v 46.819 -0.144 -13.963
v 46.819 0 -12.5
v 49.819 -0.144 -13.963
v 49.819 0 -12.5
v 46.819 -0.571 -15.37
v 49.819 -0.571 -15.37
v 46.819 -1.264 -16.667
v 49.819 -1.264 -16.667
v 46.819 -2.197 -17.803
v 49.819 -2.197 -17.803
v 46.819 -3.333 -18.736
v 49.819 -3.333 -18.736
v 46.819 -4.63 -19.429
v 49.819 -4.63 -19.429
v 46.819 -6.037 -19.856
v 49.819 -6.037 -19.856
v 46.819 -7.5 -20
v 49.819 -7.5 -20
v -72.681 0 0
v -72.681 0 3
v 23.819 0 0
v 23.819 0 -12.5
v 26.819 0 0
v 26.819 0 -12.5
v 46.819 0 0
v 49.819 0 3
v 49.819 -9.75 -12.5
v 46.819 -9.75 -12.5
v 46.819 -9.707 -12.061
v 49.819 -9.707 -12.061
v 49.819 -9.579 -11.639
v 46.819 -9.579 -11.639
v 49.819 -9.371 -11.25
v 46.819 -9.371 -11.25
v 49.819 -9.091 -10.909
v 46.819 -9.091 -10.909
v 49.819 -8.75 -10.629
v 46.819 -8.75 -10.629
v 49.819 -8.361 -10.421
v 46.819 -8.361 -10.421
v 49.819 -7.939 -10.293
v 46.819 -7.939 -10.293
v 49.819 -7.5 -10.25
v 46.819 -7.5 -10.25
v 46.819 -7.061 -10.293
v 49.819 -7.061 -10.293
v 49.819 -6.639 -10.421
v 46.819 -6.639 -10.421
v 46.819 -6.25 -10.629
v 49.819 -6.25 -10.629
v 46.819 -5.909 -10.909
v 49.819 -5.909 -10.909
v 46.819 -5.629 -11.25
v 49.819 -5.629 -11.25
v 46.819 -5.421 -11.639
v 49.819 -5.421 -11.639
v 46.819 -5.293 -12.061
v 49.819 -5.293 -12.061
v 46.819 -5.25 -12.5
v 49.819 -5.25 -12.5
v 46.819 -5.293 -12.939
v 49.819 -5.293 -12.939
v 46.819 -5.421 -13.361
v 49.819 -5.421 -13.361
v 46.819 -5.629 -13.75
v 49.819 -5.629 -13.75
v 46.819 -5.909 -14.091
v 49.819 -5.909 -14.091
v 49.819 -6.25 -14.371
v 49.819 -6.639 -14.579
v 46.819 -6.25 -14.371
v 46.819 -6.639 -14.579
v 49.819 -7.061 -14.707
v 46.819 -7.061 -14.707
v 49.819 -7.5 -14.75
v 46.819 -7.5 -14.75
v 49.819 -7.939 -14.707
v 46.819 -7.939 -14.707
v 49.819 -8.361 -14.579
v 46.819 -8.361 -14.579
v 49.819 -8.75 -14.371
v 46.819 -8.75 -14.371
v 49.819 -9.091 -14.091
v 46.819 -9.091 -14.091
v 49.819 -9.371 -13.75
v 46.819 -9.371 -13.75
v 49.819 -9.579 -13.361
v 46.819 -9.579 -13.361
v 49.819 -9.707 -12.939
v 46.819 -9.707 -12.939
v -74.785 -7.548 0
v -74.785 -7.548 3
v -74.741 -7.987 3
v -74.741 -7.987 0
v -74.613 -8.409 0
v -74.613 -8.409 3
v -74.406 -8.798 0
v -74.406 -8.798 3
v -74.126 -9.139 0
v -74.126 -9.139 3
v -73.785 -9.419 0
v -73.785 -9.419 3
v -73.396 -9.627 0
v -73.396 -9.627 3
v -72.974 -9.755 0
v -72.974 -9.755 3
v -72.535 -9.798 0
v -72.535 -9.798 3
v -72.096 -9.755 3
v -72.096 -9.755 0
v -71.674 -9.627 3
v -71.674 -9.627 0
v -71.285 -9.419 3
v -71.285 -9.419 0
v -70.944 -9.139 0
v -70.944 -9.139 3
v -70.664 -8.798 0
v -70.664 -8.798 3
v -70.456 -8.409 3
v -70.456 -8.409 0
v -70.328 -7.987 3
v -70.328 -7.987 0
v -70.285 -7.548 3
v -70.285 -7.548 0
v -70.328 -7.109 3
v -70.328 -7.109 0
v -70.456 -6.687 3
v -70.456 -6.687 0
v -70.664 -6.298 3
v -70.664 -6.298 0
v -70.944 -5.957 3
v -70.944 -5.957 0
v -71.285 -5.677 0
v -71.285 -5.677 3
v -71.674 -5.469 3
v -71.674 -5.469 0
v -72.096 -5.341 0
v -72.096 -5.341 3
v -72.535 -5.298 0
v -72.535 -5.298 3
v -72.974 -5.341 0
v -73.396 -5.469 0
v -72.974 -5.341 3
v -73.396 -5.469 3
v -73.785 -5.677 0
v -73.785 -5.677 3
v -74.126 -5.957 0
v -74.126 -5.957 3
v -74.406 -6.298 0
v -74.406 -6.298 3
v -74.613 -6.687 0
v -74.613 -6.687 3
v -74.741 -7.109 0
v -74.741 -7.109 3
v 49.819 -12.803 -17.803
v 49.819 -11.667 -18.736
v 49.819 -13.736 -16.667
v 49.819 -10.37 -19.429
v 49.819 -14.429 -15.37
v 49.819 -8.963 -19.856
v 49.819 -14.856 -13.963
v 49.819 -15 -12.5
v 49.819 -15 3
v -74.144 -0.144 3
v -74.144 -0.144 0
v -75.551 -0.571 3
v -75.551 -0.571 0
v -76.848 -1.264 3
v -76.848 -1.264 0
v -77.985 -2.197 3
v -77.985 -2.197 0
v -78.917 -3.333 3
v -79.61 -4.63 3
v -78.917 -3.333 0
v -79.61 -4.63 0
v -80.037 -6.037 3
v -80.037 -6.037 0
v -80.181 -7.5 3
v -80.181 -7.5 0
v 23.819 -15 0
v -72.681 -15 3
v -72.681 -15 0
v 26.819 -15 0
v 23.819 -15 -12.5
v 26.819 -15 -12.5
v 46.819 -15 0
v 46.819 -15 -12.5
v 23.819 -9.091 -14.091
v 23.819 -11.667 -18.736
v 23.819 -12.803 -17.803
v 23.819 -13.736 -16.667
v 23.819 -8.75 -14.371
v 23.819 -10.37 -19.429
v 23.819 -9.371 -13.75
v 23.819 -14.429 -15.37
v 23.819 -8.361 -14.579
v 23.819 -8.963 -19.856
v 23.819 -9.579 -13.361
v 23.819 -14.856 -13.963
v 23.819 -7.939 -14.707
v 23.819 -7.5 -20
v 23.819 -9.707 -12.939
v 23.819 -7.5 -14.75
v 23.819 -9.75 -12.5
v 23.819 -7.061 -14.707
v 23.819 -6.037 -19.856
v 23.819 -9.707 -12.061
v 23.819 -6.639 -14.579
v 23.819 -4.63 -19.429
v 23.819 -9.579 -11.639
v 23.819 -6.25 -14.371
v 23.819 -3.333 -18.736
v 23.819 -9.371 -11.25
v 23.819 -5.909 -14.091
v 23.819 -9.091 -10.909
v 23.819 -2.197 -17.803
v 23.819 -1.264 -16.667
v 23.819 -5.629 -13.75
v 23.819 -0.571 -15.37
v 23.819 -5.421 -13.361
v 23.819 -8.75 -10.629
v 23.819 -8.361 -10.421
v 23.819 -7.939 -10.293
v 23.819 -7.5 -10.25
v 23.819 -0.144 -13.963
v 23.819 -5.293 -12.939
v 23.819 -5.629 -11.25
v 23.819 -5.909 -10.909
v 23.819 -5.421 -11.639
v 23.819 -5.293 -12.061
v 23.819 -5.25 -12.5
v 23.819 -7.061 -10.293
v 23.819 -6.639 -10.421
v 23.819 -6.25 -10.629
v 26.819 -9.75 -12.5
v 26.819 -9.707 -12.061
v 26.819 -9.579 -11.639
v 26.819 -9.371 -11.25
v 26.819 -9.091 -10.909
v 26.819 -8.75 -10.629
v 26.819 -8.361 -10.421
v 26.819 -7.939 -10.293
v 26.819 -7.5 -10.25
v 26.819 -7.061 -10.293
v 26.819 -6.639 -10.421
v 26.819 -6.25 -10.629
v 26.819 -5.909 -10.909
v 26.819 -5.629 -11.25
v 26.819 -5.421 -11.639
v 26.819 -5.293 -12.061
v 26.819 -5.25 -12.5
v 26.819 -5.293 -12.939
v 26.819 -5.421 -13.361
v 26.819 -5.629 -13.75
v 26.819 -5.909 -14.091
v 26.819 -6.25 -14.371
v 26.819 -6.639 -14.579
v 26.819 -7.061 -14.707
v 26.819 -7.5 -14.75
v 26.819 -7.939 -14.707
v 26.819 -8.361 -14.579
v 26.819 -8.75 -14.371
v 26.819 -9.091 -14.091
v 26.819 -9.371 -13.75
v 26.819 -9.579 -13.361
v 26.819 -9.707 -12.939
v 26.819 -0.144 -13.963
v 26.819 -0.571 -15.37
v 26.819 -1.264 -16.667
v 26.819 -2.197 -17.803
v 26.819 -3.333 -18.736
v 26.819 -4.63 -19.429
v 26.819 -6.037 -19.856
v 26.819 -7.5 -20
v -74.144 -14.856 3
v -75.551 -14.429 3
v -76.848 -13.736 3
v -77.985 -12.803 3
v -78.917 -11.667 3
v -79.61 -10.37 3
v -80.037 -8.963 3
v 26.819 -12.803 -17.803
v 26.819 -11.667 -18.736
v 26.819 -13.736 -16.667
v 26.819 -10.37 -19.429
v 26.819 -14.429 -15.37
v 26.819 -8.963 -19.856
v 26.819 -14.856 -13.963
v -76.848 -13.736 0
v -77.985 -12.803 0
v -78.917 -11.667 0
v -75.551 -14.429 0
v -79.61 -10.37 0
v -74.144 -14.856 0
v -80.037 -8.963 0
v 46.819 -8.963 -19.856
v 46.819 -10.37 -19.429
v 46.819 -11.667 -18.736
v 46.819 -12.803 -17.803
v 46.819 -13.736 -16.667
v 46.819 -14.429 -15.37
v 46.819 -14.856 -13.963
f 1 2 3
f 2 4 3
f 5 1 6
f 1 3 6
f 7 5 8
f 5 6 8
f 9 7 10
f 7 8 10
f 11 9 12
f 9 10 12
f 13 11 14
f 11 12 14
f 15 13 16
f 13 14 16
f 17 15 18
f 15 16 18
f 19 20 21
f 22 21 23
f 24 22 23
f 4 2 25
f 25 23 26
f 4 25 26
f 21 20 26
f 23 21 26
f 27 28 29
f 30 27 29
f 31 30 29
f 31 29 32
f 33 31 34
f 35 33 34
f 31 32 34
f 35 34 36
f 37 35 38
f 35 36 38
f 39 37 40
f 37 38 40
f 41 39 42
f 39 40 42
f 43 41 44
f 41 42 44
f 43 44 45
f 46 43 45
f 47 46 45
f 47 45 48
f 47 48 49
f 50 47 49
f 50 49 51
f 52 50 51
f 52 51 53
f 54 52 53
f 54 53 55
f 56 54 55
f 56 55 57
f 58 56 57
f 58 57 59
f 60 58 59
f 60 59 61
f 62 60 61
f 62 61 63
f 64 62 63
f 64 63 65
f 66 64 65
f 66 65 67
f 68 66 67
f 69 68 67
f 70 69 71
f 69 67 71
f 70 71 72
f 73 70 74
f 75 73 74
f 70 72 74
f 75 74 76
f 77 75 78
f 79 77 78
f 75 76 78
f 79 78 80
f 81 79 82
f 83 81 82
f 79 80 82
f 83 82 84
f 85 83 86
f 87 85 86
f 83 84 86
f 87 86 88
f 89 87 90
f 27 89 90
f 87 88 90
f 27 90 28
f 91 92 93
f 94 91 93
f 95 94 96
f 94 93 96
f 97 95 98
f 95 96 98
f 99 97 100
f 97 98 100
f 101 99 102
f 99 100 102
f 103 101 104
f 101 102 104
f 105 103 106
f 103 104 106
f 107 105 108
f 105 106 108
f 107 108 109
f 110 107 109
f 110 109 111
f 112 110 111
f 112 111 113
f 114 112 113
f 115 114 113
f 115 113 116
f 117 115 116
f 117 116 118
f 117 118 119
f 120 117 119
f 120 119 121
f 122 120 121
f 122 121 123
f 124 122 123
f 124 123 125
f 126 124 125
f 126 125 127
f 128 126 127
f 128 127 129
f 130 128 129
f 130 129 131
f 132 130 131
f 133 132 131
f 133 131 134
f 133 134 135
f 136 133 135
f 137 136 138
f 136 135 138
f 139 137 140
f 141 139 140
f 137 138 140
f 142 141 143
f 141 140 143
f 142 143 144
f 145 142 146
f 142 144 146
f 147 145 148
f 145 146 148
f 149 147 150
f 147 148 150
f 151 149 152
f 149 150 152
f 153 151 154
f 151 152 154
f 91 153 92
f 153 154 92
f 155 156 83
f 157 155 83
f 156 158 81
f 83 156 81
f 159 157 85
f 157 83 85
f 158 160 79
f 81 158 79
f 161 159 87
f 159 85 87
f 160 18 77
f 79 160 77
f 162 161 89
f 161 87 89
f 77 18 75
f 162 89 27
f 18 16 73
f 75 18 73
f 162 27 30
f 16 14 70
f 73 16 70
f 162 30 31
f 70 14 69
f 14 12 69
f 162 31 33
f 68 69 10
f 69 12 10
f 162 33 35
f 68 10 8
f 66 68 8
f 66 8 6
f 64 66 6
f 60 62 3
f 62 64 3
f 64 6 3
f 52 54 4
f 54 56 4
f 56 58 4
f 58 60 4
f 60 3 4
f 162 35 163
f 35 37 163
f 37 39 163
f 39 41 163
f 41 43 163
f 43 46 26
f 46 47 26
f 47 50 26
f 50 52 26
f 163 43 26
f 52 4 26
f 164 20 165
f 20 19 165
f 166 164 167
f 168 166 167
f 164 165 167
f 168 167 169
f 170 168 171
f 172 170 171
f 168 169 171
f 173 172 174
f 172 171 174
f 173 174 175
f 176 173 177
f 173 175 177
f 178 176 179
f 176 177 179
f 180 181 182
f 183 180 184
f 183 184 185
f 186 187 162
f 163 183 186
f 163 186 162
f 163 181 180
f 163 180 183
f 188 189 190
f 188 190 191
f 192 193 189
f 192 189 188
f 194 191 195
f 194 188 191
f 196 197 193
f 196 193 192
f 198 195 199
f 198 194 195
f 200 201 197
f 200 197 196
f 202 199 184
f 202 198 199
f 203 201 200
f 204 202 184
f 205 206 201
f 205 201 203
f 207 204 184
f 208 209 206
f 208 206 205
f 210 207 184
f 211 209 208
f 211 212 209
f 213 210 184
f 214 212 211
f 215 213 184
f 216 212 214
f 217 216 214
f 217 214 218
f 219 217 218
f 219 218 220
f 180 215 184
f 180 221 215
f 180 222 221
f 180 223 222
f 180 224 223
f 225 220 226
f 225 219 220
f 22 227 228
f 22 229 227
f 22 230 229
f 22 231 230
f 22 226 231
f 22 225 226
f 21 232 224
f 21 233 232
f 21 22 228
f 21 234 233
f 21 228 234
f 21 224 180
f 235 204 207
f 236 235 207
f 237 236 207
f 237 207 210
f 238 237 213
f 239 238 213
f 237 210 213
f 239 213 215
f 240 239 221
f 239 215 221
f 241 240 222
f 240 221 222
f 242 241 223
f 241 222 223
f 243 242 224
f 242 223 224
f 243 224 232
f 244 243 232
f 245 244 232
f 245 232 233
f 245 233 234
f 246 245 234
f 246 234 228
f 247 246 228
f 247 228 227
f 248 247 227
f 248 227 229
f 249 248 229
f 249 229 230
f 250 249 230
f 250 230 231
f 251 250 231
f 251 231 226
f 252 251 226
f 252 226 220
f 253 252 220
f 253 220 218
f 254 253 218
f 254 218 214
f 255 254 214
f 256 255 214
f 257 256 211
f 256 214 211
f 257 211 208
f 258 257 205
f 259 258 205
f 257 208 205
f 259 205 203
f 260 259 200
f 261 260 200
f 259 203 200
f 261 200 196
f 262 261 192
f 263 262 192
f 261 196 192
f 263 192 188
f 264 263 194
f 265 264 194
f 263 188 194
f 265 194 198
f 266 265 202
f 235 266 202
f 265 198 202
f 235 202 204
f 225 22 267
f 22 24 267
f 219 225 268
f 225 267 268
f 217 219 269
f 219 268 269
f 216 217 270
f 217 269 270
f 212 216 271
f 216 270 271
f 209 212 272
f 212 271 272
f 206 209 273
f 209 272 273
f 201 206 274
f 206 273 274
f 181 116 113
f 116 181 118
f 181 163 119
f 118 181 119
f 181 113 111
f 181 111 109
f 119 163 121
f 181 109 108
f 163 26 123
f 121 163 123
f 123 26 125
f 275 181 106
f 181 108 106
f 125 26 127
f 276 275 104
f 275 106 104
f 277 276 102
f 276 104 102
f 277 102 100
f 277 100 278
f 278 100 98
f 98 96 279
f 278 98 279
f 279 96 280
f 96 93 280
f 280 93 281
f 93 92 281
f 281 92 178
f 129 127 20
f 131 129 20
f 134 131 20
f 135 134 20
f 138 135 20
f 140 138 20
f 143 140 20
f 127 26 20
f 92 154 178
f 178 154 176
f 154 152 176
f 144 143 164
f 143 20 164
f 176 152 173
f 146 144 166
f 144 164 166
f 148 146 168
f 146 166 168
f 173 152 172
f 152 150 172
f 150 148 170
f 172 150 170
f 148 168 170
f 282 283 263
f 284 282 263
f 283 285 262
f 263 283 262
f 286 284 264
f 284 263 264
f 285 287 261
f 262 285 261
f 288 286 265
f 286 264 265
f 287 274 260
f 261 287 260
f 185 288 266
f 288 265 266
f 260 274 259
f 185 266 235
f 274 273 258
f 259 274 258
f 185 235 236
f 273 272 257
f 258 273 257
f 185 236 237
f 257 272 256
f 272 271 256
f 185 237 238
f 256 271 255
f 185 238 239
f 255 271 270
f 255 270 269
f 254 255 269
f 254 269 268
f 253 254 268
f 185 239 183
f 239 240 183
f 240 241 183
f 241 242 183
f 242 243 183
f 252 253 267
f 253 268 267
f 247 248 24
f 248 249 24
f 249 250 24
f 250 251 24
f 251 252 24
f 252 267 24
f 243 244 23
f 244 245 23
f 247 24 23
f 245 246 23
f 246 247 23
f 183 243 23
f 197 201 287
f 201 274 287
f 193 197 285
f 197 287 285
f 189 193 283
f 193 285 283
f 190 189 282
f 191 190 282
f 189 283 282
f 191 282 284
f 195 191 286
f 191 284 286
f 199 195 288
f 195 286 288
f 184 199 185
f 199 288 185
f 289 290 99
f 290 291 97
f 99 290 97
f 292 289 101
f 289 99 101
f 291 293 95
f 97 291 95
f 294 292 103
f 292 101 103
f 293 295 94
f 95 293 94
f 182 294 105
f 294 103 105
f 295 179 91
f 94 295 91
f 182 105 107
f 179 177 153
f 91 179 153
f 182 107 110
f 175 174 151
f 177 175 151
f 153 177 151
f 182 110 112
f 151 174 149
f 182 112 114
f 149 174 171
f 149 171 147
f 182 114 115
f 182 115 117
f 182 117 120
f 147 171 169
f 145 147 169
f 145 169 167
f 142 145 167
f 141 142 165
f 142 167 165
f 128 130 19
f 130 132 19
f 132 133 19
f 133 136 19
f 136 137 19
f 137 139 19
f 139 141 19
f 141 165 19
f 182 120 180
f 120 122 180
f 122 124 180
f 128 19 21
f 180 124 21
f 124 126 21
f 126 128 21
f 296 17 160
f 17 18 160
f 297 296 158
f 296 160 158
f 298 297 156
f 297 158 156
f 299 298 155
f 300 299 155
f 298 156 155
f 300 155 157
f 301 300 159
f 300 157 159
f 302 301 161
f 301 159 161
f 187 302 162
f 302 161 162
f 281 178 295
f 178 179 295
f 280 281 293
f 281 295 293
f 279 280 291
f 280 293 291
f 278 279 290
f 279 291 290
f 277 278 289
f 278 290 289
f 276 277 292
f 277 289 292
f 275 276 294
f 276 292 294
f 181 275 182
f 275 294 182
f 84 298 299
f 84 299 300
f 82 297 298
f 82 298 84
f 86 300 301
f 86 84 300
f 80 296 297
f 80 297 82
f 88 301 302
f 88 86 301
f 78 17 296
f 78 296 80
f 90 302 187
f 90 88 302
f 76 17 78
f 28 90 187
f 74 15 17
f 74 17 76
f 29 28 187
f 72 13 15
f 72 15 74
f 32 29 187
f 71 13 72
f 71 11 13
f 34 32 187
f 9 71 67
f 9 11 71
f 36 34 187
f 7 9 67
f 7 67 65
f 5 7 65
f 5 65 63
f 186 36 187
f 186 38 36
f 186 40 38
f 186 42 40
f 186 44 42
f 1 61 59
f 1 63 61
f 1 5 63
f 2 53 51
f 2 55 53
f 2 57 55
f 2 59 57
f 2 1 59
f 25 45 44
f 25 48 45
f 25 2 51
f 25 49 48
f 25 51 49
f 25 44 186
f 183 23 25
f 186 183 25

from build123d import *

# Parameters (mm, degrees)
F0_W     = 3
F0_H     = 20
F1_DEPTH = 15
F3_D     = 4.5
F3_DEPTH = 4
F3_TIP   = 1.3519363928
F5_D     = 4.5
F6_R     = 7.5
F7_R     = 7.49999


# Not quite as in the source:
# - a fillet or chamfer is up to 0.001 mm smaller than in the source, because OpenCascade refuses the exact size


with BuildPart() as f1:
    # F0 (on Front) → F1 (new body)
    with BuildSketch(Plane.XZ):
        with Locations((25.3187853247, -10)):
            Rectangle(F0_W, F0_H)
        with Locations((48.3187853247, -10)):
            Rectangle(F0_W, F0_H)
        Polygon((49.8187853247, 3), (-80.1812146753, 3), (-80.1812146753, 0), (23.8187853247, 0), (26.8187853247, 0), (46.8187853247, 0), (49.8187853247, 0), align=None)
    extrude(amount=F1_DEPTH)

    # F3
    with Locations(Plane(origin=(0, 0, 0), x_dir=(1, 0, 0), z_dir=(0, 0, -1))):
        with Locations((-72.5346971303, 7.5479238294)):
            Hole(F3_D / 2, depth=F3_DEPTH)
            with Locations((0, 0, -(F3_DEPTH + F3_TIP / 2))):  # 118° drill point
                Cone(0, F3_D / 2, F3_TIP, mode=Mode.SUBTRACT)

    # F5 (through all)
    with Locations(Plane.YZ.offset(49.8187853247)):
        with Locations((-7.5, -12.5)):
            Hole(F5_D / 2)

    # F6
    f6_edges = [f1.edges().sort_by_distance(p)[0] for p in [
        (48.318785, 0, -20),
    ]]
    fillet(f6_edges, radius=F6_R)

    # F7 (radius 7.5 in the source; OpenCascade refuses exactly that, so slightly less here)
    f7_edges = [f1.edges().sort_by_distance(p)[0] for p in [
        (25.318785, -15, -20),
        (48.318785, -15, -20),
        (25.318785, 0, -20),
        (-80.181215, 0, 1.5),
        (-80.181215, -15, 1.5),
    ]]
    fillet(f7_edges, radius=F7_R)


solid = f1.part
